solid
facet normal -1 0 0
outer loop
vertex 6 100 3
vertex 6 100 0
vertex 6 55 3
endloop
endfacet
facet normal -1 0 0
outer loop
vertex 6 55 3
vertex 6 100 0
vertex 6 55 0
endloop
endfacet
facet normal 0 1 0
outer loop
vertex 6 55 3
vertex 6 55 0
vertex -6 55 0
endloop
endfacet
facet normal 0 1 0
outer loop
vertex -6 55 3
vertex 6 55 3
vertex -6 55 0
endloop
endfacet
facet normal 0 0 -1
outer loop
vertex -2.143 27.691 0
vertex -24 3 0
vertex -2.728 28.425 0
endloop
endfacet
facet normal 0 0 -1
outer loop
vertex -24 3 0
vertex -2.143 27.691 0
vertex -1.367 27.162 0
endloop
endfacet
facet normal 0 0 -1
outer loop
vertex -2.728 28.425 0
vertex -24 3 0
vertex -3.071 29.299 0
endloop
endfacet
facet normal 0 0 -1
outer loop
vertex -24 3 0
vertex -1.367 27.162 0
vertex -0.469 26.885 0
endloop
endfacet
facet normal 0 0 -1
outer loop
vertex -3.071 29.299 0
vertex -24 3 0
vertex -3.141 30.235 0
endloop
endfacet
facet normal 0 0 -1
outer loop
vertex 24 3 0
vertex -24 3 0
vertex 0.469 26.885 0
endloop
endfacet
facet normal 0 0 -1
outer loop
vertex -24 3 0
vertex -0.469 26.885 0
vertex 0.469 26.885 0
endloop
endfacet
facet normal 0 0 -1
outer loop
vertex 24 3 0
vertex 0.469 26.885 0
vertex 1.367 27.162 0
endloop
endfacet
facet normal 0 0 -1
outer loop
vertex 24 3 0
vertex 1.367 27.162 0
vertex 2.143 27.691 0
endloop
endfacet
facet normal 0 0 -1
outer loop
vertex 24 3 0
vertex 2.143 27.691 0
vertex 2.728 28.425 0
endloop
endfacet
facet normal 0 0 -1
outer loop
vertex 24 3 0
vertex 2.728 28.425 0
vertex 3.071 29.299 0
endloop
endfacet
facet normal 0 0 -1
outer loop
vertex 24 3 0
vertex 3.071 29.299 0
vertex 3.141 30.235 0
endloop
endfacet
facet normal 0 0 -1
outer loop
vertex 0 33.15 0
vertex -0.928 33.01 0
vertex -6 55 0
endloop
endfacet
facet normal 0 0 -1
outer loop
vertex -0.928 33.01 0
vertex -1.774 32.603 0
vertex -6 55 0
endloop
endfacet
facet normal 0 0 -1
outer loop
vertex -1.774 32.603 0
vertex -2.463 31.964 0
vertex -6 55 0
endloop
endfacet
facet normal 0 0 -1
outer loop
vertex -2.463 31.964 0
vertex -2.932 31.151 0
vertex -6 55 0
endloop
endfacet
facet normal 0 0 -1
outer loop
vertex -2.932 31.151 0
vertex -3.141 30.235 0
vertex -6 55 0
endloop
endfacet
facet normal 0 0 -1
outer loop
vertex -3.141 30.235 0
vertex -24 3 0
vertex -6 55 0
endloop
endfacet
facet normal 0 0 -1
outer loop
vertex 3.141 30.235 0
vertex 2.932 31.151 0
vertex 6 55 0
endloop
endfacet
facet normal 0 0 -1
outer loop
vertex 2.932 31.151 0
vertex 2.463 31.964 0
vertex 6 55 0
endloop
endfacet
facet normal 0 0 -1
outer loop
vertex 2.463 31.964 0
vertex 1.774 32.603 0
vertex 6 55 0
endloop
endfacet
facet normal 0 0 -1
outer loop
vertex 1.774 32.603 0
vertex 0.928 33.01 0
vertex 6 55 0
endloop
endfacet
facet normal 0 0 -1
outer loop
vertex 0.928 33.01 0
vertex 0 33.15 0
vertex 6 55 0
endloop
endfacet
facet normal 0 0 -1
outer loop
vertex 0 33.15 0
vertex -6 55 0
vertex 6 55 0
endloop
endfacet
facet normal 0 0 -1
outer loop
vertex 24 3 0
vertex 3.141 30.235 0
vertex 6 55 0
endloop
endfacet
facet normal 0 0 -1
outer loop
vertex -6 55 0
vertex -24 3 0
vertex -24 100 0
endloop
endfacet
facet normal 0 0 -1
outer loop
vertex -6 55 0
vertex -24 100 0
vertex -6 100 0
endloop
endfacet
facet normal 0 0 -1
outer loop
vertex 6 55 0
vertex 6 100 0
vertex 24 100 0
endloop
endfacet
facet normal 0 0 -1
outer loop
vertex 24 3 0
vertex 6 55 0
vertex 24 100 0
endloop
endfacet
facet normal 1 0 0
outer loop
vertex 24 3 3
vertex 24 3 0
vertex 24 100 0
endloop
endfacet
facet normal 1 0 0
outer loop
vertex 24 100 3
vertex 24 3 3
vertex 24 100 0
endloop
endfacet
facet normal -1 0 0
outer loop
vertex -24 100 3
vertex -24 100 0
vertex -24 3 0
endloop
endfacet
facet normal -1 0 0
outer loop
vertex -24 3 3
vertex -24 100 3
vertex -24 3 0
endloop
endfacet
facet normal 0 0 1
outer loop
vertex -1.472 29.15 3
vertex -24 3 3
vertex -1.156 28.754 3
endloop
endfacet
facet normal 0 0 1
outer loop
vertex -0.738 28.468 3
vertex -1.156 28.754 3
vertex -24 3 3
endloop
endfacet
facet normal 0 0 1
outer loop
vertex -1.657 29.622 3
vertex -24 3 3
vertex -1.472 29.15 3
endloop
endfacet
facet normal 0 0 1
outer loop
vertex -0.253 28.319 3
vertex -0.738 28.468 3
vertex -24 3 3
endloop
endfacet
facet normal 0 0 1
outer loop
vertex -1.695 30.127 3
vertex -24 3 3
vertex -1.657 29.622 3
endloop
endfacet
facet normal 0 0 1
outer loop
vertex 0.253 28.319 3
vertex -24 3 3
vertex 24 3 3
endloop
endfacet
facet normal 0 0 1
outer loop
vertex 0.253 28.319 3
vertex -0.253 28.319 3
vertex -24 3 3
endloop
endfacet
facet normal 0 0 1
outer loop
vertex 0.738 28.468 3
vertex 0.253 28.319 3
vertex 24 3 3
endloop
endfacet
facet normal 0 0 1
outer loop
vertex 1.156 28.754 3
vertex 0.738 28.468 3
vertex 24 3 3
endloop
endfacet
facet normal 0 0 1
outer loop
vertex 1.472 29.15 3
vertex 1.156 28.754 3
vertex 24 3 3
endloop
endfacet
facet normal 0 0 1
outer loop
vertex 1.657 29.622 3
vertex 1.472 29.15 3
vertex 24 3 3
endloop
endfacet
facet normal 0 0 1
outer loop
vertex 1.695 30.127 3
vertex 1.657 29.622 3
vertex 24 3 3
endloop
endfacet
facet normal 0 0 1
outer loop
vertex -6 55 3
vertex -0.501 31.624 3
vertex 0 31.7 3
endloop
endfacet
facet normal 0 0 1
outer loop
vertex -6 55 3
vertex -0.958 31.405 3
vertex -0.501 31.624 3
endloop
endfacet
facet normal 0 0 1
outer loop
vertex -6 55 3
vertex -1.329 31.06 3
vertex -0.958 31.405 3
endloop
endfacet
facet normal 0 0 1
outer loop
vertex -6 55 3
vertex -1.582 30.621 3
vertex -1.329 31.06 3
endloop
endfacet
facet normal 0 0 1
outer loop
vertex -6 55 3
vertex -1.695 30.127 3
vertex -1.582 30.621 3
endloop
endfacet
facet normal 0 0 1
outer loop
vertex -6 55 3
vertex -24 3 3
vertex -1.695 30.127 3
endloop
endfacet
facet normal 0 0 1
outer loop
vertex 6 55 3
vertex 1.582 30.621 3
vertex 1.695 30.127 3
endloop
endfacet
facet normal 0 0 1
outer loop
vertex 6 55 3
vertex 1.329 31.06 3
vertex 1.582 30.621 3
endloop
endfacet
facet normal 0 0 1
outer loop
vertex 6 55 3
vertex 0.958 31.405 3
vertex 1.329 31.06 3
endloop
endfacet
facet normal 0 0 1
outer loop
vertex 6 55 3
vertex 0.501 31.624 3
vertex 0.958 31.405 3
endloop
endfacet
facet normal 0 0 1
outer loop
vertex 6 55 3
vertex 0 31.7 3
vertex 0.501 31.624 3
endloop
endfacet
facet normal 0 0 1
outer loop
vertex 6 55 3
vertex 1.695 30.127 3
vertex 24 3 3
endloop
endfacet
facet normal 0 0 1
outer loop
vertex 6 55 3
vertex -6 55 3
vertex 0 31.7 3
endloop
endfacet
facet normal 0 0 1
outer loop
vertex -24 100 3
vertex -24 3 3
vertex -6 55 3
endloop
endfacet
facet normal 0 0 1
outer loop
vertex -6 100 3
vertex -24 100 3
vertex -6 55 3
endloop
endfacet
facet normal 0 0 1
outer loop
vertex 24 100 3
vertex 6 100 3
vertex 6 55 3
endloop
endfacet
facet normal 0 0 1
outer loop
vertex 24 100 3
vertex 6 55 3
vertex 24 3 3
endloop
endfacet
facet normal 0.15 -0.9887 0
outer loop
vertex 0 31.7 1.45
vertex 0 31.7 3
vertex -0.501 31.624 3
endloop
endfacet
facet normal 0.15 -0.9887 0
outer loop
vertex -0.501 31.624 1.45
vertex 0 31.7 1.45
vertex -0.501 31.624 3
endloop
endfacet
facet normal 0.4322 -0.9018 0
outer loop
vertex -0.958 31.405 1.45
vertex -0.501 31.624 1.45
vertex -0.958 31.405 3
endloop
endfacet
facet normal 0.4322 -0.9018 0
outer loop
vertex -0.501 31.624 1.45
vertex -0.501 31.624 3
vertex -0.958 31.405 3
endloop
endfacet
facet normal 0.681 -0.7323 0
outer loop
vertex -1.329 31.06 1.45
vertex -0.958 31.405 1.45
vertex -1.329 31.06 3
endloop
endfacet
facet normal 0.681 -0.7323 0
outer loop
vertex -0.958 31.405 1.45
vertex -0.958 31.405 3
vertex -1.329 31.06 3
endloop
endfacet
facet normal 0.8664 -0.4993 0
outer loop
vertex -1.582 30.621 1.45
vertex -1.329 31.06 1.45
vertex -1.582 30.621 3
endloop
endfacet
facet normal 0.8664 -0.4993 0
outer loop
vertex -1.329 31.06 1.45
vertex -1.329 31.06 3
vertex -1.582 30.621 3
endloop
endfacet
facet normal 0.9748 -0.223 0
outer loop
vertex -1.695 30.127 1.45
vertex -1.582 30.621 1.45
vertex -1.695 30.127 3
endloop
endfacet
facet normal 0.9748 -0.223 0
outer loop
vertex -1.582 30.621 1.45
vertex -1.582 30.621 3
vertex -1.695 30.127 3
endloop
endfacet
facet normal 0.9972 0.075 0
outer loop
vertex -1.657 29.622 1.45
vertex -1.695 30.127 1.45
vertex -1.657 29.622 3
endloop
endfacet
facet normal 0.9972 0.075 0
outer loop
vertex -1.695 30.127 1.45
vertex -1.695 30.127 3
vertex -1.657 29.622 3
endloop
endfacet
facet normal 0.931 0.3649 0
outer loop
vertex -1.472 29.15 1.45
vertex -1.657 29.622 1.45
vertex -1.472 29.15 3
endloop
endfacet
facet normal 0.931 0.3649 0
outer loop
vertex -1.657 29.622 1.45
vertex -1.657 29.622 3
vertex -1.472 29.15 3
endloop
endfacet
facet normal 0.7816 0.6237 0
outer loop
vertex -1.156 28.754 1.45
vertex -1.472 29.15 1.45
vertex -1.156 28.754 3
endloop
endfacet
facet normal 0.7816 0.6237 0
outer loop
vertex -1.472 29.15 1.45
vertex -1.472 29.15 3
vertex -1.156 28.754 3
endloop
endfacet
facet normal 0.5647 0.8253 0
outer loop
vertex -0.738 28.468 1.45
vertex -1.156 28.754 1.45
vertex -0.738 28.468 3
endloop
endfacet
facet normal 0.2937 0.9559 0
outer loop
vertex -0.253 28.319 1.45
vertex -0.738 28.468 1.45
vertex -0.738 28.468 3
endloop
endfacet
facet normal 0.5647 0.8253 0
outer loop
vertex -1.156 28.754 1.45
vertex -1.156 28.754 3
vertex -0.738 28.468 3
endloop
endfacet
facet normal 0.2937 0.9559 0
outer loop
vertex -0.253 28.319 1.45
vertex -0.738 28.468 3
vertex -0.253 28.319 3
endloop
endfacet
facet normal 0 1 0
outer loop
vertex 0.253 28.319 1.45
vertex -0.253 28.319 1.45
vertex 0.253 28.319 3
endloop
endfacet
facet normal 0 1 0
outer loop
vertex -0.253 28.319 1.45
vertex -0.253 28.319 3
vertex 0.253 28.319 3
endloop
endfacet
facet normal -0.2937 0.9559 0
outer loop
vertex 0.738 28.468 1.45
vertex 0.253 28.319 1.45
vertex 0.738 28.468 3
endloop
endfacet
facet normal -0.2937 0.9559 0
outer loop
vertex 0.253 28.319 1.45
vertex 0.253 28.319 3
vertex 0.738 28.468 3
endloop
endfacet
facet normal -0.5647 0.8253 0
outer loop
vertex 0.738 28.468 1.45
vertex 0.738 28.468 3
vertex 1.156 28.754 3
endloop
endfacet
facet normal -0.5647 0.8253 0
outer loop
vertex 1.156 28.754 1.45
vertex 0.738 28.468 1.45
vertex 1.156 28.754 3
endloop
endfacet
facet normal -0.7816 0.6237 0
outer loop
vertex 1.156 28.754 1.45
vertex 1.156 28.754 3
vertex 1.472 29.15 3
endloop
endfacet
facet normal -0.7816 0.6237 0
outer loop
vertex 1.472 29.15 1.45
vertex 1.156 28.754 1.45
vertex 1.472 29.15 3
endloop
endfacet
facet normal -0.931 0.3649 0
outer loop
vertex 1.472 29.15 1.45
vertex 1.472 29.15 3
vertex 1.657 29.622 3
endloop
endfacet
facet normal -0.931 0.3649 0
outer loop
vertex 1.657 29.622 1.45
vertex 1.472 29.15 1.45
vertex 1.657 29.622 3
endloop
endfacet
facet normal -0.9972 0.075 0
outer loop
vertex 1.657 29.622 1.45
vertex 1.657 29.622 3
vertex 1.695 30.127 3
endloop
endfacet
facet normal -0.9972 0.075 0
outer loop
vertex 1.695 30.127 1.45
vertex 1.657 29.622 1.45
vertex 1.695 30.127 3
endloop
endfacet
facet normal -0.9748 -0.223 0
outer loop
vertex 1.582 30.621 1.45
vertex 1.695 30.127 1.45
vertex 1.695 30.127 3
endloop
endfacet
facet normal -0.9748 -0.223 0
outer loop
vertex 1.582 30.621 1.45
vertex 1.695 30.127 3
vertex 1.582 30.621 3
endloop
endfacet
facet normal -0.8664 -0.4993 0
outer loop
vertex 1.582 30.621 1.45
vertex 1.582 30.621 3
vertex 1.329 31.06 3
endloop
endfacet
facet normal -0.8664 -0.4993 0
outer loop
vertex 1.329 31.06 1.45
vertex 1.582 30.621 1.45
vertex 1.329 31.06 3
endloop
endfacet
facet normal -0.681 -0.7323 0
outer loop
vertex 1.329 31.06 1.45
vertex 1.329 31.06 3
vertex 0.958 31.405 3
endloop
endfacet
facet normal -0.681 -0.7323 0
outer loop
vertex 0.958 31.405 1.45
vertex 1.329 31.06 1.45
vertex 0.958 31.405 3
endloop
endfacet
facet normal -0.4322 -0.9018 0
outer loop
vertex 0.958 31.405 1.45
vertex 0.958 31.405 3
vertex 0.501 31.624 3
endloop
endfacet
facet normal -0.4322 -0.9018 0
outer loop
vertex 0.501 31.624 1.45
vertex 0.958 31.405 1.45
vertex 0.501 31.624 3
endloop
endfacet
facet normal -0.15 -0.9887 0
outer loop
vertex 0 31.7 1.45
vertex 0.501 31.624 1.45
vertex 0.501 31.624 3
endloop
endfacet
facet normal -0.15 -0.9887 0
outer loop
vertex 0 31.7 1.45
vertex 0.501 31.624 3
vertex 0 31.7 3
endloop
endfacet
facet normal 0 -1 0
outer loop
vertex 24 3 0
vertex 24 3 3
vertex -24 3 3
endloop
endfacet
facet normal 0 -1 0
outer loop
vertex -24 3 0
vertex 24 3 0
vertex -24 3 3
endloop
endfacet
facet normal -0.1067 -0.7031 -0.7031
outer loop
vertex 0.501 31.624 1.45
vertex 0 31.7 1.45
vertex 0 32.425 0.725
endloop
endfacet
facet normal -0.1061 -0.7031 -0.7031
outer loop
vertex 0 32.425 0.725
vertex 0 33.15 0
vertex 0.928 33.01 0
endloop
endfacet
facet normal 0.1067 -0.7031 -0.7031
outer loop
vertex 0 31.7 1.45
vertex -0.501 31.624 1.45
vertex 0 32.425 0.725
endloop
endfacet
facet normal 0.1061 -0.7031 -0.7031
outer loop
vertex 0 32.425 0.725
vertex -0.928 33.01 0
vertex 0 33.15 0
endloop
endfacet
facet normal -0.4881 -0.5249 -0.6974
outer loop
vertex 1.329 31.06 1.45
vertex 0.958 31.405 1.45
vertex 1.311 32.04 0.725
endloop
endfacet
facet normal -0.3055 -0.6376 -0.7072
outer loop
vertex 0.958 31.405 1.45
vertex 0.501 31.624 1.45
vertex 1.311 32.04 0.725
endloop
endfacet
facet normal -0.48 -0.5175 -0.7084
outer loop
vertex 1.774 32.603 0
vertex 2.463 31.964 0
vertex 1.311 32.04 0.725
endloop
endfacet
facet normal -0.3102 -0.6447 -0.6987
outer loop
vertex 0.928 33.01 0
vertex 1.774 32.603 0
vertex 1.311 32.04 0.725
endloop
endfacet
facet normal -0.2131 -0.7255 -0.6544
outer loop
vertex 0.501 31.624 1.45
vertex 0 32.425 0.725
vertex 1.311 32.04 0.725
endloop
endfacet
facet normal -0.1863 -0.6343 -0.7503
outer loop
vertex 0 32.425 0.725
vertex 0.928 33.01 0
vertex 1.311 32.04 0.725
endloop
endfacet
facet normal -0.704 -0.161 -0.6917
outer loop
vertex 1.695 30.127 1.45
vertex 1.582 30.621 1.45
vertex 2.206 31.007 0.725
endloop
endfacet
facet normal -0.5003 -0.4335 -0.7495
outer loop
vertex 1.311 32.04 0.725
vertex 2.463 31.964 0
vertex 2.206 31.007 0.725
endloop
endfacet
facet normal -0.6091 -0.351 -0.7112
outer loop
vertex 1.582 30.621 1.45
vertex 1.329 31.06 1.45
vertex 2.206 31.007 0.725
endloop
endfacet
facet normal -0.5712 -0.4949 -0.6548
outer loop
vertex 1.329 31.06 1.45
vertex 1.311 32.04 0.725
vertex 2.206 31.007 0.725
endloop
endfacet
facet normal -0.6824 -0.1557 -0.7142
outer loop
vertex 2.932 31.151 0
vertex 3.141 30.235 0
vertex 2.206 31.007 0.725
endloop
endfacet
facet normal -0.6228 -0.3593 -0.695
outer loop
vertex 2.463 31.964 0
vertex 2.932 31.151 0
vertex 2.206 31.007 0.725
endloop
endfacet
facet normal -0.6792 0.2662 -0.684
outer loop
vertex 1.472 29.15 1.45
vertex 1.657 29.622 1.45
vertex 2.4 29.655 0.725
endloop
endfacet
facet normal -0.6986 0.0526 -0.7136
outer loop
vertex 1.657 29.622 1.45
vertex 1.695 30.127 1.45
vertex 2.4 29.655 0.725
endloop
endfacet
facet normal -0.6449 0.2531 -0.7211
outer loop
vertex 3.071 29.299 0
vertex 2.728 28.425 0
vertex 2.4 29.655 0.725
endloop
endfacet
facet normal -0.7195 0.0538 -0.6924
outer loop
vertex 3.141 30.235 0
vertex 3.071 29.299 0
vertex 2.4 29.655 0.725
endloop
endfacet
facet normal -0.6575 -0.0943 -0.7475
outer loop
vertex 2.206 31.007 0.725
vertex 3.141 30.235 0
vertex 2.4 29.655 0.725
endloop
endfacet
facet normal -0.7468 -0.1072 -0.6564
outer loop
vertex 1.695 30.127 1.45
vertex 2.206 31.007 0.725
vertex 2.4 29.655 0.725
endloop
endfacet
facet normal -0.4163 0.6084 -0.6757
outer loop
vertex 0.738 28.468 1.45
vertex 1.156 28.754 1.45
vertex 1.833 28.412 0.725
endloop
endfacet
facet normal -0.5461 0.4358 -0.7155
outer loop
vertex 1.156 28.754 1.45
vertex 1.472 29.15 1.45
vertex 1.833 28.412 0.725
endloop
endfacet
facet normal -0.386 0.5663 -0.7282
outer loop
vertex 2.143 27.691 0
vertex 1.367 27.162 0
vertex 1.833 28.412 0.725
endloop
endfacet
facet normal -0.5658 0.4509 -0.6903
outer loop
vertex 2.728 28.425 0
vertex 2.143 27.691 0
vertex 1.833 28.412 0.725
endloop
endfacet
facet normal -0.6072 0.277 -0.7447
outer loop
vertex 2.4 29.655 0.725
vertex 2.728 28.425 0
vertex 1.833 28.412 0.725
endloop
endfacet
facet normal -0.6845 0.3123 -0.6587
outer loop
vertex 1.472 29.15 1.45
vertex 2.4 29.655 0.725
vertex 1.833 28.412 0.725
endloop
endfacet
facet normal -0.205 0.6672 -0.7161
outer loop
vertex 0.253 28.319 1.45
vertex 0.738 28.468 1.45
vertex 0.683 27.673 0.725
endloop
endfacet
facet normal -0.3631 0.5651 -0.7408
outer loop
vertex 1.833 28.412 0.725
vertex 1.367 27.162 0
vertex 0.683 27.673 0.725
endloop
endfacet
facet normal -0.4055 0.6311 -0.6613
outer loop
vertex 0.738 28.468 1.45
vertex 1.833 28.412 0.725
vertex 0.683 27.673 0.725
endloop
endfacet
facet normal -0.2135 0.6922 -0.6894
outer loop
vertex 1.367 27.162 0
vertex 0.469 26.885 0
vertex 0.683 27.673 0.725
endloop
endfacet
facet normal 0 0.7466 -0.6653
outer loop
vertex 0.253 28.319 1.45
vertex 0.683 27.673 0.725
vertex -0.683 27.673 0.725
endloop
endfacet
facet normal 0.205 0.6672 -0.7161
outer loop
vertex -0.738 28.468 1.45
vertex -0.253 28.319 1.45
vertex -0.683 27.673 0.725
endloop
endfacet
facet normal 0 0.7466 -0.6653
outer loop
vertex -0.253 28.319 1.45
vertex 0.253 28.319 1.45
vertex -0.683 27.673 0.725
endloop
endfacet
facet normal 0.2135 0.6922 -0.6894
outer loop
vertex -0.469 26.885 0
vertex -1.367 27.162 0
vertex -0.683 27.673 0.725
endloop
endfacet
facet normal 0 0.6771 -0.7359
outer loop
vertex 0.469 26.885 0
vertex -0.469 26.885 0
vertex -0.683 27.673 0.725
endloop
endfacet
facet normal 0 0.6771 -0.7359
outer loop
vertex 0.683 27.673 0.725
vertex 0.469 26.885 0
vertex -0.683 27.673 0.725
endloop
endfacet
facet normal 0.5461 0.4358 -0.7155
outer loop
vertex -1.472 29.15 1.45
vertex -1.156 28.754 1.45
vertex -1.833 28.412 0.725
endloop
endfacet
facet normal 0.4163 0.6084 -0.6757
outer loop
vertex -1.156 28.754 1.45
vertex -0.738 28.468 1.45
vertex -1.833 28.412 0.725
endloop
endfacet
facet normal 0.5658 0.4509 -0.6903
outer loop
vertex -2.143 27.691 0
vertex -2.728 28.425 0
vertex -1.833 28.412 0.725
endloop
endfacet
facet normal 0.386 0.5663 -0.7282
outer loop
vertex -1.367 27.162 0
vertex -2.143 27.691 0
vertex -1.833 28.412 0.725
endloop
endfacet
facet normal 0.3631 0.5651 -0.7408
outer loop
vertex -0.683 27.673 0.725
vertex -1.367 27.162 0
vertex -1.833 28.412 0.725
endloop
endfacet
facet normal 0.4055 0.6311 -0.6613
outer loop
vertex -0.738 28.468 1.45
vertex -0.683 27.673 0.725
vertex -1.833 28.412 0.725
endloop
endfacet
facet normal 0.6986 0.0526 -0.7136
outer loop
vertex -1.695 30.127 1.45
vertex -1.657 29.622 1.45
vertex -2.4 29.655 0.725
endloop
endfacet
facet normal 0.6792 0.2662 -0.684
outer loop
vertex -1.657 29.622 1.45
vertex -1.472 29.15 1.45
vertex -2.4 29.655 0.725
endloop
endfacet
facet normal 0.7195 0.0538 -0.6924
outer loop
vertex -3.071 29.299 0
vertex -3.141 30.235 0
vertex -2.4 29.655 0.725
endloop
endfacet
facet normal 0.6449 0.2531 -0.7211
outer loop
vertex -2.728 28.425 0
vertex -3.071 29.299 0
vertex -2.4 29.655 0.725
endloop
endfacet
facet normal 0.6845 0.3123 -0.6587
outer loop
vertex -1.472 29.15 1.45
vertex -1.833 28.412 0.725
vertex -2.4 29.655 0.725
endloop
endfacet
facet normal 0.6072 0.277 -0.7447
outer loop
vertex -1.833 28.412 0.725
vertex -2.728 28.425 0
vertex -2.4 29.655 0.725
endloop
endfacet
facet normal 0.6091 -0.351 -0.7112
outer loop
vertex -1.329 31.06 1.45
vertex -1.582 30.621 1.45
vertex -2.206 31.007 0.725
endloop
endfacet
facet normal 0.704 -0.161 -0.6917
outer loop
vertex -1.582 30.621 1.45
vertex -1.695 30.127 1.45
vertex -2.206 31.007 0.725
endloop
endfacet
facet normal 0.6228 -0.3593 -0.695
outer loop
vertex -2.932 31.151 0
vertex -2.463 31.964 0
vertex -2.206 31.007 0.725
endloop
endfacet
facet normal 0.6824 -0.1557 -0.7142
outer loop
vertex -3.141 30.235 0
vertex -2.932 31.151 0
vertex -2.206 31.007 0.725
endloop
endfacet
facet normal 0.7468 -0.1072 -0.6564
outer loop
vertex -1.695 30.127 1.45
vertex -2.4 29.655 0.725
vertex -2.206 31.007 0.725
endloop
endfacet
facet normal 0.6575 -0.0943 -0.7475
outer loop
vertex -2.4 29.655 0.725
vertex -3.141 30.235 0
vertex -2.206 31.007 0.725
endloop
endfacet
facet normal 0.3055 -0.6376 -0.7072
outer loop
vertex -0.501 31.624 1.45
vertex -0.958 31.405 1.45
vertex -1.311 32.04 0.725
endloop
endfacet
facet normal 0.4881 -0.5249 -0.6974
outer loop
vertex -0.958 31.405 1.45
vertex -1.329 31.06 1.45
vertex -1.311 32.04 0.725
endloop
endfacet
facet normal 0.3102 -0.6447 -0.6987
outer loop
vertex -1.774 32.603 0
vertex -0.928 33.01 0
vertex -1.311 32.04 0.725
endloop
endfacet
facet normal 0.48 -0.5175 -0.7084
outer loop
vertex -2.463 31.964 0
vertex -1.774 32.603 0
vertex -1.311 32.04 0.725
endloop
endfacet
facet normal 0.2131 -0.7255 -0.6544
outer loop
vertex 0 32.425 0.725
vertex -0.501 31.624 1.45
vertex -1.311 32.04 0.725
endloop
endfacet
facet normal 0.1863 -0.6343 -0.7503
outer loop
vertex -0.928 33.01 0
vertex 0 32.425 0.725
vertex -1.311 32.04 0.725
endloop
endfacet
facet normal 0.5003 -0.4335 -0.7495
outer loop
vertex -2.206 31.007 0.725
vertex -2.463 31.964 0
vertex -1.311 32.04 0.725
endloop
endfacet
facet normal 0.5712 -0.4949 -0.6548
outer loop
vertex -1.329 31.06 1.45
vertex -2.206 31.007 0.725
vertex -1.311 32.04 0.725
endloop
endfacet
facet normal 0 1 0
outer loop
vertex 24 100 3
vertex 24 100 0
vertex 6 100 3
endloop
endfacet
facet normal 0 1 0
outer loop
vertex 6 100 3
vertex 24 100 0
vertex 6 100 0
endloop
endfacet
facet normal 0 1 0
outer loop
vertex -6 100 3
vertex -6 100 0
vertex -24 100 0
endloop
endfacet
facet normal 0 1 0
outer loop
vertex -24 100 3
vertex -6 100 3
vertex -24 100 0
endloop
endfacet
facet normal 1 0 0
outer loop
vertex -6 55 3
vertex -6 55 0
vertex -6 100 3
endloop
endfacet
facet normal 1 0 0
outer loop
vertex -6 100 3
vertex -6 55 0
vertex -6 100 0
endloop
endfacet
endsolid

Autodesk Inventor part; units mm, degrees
ref_plane "Plan YZ" through (0, 0, 0) normal (1, 0, 0) x (0, 1, 0)
ref_plane "Plan XZ" through (0, 0, 0) normal (0, 1, 0) x (-1, 0, 0)
ref_plane "Plan XY" through (0, 0, 0) normal (0, 0, 1) x (1, 0, 0)
sketch "Esquisse6" plane through (0, 0, 0) normal (0, 0, 1) x (1, 0, 0)
  line L0 (0, -20) -> (0, 120) construction
  line L1 (-24, 0) -> (24, 0)
  line L2 (24, 0) -> (24, 100)
  line L3 (24, 100) -> (6, 100)
  line L4 (6, 100) -> (6, 55)
  line L5 (6, 55) -> (-6, 55)
  line L6 (-6, 55) -> (-6, 100)
  line L7 (-6, 100) -> (-24, 100)
  line L8 (-24, 100) -> (-24, 0)
  line L9 (-33.6, 0) -> (33.6, 0) construction
  point P0 (0, 0)
  dimension "d0" = 100
  dimension "d1" = 48
  dimension "d2" = 12
  dimension "d3" = 45
extrude "Extrusion1" add sketch "Esquisse6" along normal blind 3
sketch "Esquisse7" plane through (0, 0, 0) normal (0, 0, -1) x (-1, 0, 0)
  line L0 (0, -20) -> (0, 120) construction
  line L1 (-24, 0) -> (24, 0) projected
  point P0 (0, 0)
  point P1 (0, 30)
  dimension "d24" = 30
sketch "Esquisse8" plane through (0, 0, 3) normal (0, 0, 1) x (1, 0, 0)
  line L0 (24, 100) -> (24, 0) projected
  line L1 (-24, 0) -> (24, 0)
  line L2 (24, 0) -> (24, 3)
  line L3 (24, 3) -> (-24, 3)
  line L4 (-24, 3) -> (-24, 0)
  line L5 (-24, 100) -> (-24, 0) projected
  line L6 (24, 0) -> (24, 100) projected
  line L7 (-24, 0) -> (24, 0) projected
  point P0 (0, 0)
  dimension "d21" = 3
extrude "Extrusion3" cut sketch "Esquisse8" against normal through all
hole "Perçage1" at (0, 30, 0) direction (0, 0, 1) diameter 3.4 end through all countersink diameter 6.3 countersink angle 90 clearance for "Vis à tête plate fraisée ISO 2009/7046" size "M3" standard "ISO"
properties part number "S1702_replat" material "Plastique PMMA"
